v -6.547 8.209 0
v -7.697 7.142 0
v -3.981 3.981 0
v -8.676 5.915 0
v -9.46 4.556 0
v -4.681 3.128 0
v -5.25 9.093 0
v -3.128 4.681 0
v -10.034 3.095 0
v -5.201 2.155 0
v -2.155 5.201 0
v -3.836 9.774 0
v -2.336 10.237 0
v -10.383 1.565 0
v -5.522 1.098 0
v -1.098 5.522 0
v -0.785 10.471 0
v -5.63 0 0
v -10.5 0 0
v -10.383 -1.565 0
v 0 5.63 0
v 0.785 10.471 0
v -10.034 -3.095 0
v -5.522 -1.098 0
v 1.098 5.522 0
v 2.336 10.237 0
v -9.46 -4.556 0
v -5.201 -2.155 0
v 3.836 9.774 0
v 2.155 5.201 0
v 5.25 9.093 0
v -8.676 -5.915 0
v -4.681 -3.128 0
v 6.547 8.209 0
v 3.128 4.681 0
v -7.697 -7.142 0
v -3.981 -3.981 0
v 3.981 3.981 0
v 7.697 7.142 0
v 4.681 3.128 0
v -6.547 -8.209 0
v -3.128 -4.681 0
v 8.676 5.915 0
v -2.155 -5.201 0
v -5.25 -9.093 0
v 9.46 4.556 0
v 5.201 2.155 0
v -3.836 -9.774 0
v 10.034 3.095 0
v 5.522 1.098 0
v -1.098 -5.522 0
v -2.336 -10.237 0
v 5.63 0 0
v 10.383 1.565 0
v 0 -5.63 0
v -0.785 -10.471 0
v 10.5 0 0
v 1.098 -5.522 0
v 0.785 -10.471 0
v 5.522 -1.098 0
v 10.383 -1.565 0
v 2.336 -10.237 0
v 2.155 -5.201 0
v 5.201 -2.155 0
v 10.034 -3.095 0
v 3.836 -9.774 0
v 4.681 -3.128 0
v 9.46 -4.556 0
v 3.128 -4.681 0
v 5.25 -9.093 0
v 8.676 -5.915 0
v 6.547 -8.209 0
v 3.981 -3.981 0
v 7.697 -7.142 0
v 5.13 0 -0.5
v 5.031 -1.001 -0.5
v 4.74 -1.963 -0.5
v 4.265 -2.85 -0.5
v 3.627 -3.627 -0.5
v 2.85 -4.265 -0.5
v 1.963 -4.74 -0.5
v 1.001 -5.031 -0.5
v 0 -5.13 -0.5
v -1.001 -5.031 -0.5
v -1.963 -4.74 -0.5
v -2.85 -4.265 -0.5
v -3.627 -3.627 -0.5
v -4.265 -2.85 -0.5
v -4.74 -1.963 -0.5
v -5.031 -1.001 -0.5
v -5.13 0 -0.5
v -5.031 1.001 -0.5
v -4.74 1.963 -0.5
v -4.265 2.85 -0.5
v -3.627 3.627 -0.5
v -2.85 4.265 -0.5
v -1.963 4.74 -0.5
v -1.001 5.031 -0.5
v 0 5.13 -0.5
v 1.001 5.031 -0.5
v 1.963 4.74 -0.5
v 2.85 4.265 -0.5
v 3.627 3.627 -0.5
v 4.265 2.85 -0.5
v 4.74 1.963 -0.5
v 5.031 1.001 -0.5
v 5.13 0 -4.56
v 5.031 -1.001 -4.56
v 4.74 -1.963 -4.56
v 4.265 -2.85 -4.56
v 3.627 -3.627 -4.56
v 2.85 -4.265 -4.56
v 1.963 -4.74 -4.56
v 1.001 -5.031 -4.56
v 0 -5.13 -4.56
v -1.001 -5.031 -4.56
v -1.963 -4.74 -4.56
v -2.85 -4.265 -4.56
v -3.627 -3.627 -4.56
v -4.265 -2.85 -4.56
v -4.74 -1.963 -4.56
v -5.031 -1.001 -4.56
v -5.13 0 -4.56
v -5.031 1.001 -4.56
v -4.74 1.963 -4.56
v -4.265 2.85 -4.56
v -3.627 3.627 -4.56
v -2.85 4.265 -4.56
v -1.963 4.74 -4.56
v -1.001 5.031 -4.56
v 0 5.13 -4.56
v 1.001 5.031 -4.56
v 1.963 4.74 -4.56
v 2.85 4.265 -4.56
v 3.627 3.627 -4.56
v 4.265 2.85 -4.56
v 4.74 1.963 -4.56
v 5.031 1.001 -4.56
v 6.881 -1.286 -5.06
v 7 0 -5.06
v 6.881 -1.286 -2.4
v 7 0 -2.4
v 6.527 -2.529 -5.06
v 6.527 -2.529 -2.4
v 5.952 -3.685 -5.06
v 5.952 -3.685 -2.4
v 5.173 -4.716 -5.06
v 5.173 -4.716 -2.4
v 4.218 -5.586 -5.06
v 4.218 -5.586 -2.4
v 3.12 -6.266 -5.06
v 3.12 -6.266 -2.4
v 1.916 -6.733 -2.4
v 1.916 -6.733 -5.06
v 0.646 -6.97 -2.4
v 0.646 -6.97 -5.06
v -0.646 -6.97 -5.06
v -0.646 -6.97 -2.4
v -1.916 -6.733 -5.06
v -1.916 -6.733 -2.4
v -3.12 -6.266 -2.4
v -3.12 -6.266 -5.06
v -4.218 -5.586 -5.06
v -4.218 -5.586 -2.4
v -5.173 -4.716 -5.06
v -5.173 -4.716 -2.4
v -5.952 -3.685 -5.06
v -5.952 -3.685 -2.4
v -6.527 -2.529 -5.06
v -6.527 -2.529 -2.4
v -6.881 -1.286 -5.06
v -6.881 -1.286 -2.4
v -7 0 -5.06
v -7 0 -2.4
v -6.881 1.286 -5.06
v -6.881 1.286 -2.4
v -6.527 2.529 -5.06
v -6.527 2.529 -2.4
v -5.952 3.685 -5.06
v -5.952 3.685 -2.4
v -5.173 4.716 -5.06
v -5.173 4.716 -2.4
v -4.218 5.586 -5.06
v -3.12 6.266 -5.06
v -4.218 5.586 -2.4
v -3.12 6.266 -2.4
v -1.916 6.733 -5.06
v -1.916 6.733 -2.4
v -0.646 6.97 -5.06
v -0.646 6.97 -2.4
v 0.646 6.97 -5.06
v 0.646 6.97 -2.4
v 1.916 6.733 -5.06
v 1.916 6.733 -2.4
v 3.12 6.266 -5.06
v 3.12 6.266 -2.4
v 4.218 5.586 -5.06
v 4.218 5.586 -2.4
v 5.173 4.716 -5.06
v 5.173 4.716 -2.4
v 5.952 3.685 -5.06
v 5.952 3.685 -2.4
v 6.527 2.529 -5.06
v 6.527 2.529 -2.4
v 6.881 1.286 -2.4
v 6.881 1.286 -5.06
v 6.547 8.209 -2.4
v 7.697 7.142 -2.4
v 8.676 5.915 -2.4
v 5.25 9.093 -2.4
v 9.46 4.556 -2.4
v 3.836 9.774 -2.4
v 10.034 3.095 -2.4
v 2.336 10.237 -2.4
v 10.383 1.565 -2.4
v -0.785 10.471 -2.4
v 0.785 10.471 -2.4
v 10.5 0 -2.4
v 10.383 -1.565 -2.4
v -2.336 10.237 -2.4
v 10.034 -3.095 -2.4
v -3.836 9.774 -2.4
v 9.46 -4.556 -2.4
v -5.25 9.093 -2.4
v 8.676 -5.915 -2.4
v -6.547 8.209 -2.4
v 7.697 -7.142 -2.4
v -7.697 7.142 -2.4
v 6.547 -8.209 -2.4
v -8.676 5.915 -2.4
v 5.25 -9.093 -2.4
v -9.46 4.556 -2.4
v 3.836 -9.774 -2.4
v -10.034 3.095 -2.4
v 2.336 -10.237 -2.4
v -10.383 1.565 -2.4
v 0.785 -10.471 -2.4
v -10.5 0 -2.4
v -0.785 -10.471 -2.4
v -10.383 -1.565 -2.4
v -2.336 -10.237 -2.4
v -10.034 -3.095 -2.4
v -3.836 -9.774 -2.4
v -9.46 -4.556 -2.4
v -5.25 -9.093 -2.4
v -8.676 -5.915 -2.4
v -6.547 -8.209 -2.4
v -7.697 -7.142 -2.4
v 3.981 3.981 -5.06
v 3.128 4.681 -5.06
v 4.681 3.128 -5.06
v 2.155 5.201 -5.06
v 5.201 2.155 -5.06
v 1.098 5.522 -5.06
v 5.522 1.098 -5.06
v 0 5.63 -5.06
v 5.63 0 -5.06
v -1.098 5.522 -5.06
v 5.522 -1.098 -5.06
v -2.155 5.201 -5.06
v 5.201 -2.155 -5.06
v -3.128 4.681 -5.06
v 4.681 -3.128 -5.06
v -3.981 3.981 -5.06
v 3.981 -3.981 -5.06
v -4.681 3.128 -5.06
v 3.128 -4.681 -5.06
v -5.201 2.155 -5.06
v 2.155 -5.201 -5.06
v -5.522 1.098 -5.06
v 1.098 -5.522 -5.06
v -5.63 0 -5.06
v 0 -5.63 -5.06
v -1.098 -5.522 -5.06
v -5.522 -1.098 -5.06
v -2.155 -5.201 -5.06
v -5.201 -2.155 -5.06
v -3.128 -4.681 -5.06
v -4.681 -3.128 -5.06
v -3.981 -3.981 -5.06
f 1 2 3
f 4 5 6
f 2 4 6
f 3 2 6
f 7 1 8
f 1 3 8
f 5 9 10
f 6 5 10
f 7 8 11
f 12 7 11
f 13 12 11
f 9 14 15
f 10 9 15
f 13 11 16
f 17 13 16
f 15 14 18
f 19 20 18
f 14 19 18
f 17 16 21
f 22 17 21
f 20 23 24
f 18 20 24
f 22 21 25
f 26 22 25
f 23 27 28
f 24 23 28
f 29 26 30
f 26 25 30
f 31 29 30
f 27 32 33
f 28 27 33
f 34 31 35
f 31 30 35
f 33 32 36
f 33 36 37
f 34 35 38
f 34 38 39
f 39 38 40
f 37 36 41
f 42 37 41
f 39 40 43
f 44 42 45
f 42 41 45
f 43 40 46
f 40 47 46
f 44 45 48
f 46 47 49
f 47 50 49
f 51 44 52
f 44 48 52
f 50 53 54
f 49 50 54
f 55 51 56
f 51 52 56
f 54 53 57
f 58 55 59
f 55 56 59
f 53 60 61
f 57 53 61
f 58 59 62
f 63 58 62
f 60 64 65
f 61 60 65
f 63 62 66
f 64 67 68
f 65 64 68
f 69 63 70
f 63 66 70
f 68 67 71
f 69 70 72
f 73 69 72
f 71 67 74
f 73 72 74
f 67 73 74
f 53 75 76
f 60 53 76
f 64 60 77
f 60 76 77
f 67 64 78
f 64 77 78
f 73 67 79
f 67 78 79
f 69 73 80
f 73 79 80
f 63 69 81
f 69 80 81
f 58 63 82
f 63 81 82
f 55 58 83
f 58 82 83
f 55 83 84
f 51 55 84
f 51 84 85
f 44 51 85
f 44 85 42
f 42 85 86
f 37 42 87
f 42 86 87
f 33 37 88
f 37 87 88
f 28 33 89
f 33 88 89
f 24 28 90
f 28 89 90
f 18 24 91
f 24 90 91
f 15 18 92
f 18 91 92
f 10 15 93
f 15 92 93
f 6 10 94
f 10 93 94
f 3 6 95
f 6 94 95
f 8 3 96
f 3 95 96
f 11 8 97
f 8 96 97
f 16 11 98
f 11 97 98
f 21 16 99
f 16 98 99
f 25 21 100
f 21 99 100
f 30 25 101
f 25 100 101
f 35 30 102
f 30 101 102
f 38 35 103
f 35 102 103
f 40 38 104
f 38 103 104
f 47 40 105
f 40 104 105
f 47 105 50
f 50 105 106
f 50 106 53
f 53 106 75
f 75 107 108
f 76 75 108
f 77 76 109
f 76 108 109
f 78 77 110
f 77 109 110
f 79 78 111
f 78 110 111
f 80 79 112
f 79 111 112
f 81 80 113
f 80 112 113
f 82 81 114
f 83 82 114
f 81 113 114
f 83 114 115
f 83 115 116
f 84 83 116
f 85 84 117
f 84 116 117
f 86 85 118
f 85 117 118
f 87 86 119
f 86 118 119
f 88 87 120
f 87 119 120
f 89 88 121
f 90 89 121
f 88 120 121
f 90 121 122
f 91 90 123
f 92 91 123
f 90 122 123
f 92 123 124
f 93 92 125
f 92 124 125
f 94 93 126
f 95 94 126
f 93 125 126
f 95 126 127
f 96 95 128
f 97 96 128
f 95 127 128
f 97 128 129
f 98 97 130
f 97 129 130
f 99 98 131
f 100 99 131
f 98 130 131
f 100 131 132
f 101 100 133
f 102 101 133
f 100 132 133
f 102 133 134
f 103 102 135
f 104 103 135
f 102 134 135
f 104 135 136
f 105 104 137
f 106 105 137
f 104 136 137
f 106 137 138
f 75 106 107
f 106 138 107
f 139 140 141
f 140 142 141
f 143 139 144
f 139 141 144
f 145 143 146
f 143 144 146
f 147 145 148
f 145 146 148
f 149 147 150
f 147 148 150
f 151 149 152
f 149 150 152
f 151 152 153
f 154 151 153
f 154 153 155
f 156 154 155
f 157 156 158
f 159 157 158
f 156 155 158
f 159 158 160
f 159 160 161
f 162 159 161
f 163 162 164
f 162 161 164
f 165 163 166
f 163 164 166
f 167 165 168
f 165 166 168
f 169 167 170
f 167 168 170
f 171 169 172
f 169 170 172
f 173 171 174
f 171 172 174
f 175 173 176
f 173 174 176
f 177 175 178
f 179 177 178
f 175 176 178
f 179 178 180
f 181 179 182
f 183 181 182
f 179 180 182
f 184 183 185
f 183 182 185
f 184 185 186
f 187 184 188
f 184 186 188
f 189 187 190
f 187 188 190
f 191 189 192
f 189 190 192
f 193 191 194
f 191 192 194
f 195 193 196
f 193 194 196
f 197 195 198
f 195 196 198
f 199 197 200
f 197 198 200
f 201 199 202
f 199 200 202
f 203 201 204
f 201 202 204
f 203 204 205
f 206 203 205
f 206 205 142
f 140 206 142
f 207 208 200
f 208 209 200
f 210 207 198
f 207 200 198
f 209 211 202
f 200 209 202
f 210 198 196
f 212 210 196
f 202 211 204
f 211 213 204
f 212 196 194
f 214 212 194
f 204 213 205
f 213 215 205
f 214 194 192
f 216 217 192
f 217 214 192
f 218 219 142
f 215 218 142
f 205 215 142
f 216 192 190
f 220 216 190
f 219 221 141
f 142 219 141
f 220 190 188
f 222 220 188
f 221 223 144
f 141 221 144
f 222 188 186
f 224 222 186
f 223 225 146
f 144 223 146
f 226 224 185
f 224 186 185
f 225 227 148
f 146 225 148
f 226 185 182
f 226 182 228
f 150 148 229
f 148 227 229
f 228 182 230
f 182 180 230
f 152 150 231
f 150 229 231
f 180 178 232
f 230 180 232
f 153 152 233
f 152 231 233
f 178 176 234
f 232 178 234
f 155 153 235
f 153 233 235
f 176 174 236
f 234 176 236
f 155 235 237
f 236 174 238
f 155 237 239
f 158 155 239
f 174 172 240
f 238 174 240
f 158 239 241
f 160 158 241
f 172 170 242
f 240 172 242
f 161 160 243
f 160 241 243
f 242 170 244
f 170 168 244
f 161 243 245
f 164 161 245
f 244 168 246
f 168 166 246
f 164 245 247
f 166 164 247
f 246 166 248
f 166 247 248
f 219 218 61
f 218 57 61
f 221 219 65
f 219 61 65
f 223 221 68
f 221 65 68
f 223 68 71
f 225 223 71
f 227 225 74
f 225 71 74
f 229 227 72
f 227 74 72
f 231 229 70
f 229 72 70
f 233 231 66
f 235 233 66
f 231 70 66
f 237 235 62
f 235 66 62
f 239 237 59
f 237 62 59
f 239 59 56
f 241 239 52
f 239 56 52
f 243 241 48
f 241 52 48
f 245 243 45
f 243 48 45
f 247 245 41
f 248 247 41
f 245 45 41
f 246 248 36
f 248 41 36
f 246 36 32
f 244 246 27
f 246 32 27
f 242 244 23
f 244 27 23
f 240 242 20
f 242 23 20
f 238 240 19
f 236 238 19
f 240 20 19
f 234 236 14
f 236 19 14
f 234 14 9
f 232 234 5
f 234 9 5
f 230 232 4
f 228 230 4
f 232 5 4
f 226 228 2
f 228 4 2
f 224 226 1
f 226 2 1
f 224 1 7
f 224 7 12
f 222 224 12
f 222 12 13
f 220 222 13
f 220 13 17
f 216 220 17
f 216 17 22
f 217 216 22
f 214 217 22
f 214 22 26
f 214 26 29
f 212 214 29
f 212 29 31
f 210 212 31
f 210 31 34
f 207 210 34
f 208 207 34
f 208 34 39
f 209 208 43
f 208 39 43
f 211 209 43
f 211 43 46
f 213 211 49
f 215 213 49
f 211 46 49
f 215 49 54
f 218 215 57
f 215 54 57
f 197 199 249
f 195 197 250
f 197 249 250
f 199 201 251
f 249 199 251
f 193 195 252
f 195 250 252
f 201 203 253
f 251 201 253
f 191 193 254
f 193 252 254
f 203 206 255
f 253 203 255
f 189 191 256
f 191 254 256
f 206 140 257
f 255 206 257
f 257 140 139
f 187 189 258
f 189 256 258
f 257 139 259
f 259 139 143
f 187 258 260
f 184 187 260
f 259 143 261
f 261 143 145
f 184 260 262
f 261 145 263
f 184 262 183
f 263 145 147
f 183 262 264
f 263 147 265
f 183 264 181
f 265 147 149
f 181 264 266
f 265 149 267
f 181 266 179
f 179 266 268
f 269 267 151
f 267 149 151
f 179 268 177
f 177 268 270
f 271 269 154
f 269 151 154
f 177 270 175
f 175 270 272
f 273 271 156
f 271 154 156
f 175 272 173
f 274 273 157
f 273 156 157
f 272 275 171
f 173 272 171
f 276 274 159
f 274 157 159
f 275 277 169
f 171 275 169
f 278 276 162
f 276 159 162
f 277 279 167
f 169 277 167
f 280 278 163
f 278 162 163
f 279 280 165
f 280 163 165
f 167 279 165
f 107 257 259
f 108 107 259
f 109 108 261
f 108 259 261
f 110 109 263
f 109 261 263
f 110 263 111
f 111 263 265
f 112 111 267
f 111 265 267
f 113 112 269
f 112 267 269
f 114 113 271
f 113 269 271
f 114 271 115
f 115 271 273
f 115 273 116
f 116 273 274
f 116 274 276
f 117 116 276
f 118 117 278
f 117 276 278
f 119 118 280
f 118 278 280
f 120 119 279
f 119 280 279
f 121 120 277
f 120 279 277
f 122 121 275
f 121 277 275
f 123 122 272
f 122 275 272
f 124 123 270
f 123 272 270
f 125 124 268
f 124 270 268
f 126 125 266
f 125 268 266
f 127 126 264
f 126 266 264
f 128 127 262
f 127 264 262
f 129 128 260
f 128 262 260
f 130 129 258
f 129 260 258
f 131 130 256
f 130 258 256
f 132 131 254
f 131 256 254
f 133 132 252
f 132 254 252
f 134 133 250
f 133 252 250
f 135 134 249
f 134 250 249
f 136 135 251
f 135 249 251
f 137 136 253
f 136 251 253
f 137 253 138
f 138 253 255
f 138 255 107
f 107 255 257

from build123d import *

# Parameters (mm, degrees)
CHANFREIN1_SIZE = 0.5
CHANFREIN2_SIZE = 0.5


with BuildPart() as part:
    # Esquisse1 → Révolution1 (revolve)
    with BuildSketch(Plane(origin=(0, 0, 0), x_dir=(0, 0, -1), z_dir=(1, 0, 0)), mode=Mode.PRIVATE) as r_volution1_sk:
        Polygon((0, 10.5), (0, 5.13), (5.06, 5.13), (5.06, 7), (2.4, 7), (2.4, 10.5), align=None)
    revolve(r_volution1_sk.sketch.rotate(Axis((0, 0, 0), (0, 0, -1)), 90), axis=Axis((0, 0, 0), (0, 0, -1)))  # turned: the seam where the file's is

    # Chanfrein1
    chanfrein1_edges = [part.edges().sort_by_distance(p)[0] for p in [
        (-5.13, 0, 0),
    ]]
    chamfer(chanfrein1_edges, length=CHANFREIN1_SIZE)

    # Chanfrein2
    chanfrein2_edges = [part.edges().sort_by_distance(p)[0] for p in [
        (-5.13, 0, -5.06),
    ]]
    chamfer(chanfrein2_edges, length=CHANFREIN2_SIZE)


solid = part.part
